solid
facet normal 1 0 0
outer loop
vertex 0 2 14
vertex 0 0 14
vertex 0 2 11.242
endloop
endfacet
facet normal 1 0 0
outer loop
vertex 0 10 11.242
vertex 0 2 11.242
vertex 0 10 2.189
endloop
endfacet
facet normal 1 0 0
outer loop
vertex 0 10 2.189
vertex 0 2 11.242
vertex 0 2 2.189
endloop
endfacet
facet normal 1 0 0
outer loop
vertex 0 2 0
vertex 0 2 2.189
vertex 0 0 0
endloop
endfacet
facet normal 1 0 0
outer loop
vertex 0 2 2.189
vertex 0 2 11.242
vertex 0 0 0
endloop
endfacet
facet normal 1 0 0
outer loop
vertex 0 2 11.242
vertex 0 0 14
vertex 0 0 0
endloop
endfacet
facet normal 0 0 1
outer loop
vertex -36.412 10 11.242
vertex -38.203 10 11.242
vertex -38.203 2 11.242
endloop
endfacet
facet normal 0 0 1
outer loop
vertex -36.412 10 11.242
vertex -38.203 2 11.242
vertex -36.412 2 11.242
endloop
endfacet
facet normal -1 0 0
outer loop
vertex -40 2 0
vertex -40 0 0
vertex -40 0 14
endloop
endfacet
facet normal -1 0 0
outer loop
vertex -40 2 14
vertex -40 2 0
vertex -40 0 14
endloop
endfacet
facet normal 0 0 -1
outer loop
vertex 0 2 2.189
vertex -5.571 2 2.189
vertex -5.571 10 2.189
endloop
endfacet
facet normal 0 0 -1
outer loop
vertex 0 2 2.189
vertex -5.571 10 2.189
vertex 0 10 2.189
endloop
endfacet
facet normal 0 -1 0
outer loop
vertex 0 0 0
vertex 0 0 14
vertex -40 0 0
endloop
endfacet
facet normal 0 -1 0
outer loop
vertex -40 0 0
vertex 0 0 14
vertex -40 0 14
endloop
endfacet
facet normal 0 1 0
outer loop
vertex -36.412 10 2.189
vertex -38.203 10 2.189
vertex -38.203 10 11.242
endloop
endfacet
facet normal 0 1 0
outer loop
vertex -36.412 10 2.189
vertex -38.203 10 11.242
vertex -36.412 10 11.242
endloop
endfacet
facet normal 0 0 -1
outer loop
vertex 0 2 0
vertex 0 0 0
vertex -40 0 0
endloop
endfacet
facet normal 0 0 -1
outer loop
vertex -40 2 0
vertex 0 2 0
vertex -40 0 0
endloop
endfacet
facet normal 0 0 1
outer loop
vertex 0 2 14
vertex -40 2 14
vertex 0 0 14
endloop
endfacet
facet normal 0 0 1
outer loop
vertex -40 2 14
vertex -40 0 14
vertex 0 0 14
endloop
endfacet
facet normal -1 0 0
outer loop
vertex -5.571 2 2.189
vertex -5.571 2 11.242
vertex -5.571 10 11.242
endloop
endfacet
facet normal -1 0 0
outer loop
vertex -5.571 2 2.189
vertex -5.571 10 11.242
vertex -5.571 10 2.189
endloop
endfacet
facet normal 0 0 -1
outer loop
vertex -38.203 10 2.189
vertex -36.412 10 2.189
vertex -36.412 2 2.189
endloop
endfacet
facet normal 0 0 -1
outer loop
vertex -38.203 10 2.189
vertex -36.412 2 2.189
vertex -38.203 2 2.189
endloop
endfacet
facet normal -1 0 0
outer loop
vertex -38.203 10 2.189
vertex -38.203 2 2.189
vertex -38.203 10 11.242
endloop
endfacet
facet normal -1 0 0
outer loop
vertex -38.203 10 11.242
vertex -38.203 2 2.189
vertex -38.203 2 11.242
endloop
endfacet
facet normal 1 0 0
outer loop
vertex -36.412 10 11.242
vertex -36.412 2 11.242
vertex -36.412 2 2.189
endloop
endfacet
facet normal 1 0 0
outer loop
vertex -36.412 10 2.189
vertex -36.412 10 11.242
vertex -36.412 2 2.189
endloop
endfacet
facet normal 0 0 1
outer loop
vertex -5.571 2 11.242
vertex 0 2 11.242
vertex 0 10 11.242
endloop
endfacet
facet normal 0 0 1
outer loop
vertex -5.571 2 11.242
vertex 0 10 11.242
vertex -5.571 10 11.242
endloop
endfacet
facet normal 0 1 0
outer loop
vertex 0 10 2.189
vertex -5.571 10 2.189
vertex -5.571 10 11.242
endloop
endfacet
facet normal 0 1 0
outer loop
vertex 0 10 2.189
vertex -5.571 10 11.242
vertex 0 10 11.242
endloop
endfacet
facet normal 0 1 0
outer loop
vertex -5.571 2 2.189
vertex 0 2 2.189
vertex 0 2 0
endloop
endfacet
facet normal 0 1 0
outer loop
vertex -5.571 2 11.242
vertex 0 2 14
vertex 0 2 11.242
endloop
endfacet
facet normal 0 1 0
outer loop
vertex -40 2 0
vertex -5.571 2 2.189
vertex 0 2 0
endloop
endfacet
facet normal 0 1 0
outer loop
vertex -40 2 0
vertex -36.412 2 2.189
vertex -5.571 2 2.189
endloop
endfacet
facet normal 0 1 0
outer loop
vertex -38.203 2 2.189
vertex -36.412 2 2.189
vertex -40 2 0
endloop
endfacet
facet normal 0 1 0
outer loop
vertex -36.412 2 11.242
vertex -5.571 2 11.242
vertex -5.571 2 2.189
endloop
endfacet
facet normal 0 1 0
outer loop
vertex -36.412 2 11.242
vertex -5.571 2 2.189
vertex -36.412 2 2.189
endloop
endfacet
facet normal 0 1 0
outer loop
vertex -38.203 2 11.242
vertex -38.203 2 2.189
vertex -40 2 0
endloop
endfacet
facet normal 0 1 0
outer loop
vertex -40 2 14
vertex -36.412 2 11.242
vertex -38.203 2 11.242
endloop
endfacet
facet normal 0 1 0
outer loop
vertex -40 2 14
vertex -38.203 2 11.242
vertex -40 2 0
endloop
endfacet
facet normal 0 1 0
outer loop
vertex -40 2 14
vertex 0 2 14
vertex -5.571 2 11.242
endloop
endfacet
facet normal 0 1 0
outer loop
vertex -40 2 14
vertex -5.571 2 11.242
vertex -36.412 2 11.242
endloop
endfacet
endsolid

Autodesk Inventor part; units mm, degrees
ref_plane "YZ Plane" through (0, 0, 0) normal (1, 0, 0) x (0, 1, 0)
ref_plane "XZ Plane" through (0, 0, 0) normal (0, 1, 0) x (-1, 0, 0)
ref_plane "XY Plane" through (0, 0, 0) normal (0, 0, 1) x (1, 0, 0)
sketch "Sketch1" plane through (0, 0, 0) normal (0, 1, 0) x (-1, 0, 0)
  line L0 (0, 0) -> (40, 0)
  line L1 (40, 0) -> (40, 14)
  line L2 (40, 14) -> (0, 14)
  line L3 (0, 14) -> (0, 0)
  dimension "d0" = 40
  dimension "d1" = 14
extrude "Extrusion1" add sketch "Sketch1" along normal blind 2
sketch "Sketch2" plane through (0, 2, 0) normal (0, 1, 0) x (1, 0, 0)
  line L0 (0, -14) -> (0, 0) projected
  line L1 (0, -11.242) -> (-5.5713, -11.242)
  line L2 (-5.5713, -11.242) -> (-5.5713, -2.1887)
  line L3 (-5.5713, -2.1887) -> (0, -2.1887)
  line L4 (0, -2.1887) -> (0, -11.242)
  line L5 (-38.2029, -11.242) -> (-36.4121, -11.242)
  line L6 (-36.4121, -11.242) -> (-36.4121, -2.1887)
  line L7 (-36.4121, -2.1887) -> (-38.2029, -2.1887)
  line L8 (-38.2029, -2.1887) -> (-38.2029, -11.242)
extrude "Extrusion2" add sketch "Sketch2" along normal blind 8
properties part number "00_LM286"
